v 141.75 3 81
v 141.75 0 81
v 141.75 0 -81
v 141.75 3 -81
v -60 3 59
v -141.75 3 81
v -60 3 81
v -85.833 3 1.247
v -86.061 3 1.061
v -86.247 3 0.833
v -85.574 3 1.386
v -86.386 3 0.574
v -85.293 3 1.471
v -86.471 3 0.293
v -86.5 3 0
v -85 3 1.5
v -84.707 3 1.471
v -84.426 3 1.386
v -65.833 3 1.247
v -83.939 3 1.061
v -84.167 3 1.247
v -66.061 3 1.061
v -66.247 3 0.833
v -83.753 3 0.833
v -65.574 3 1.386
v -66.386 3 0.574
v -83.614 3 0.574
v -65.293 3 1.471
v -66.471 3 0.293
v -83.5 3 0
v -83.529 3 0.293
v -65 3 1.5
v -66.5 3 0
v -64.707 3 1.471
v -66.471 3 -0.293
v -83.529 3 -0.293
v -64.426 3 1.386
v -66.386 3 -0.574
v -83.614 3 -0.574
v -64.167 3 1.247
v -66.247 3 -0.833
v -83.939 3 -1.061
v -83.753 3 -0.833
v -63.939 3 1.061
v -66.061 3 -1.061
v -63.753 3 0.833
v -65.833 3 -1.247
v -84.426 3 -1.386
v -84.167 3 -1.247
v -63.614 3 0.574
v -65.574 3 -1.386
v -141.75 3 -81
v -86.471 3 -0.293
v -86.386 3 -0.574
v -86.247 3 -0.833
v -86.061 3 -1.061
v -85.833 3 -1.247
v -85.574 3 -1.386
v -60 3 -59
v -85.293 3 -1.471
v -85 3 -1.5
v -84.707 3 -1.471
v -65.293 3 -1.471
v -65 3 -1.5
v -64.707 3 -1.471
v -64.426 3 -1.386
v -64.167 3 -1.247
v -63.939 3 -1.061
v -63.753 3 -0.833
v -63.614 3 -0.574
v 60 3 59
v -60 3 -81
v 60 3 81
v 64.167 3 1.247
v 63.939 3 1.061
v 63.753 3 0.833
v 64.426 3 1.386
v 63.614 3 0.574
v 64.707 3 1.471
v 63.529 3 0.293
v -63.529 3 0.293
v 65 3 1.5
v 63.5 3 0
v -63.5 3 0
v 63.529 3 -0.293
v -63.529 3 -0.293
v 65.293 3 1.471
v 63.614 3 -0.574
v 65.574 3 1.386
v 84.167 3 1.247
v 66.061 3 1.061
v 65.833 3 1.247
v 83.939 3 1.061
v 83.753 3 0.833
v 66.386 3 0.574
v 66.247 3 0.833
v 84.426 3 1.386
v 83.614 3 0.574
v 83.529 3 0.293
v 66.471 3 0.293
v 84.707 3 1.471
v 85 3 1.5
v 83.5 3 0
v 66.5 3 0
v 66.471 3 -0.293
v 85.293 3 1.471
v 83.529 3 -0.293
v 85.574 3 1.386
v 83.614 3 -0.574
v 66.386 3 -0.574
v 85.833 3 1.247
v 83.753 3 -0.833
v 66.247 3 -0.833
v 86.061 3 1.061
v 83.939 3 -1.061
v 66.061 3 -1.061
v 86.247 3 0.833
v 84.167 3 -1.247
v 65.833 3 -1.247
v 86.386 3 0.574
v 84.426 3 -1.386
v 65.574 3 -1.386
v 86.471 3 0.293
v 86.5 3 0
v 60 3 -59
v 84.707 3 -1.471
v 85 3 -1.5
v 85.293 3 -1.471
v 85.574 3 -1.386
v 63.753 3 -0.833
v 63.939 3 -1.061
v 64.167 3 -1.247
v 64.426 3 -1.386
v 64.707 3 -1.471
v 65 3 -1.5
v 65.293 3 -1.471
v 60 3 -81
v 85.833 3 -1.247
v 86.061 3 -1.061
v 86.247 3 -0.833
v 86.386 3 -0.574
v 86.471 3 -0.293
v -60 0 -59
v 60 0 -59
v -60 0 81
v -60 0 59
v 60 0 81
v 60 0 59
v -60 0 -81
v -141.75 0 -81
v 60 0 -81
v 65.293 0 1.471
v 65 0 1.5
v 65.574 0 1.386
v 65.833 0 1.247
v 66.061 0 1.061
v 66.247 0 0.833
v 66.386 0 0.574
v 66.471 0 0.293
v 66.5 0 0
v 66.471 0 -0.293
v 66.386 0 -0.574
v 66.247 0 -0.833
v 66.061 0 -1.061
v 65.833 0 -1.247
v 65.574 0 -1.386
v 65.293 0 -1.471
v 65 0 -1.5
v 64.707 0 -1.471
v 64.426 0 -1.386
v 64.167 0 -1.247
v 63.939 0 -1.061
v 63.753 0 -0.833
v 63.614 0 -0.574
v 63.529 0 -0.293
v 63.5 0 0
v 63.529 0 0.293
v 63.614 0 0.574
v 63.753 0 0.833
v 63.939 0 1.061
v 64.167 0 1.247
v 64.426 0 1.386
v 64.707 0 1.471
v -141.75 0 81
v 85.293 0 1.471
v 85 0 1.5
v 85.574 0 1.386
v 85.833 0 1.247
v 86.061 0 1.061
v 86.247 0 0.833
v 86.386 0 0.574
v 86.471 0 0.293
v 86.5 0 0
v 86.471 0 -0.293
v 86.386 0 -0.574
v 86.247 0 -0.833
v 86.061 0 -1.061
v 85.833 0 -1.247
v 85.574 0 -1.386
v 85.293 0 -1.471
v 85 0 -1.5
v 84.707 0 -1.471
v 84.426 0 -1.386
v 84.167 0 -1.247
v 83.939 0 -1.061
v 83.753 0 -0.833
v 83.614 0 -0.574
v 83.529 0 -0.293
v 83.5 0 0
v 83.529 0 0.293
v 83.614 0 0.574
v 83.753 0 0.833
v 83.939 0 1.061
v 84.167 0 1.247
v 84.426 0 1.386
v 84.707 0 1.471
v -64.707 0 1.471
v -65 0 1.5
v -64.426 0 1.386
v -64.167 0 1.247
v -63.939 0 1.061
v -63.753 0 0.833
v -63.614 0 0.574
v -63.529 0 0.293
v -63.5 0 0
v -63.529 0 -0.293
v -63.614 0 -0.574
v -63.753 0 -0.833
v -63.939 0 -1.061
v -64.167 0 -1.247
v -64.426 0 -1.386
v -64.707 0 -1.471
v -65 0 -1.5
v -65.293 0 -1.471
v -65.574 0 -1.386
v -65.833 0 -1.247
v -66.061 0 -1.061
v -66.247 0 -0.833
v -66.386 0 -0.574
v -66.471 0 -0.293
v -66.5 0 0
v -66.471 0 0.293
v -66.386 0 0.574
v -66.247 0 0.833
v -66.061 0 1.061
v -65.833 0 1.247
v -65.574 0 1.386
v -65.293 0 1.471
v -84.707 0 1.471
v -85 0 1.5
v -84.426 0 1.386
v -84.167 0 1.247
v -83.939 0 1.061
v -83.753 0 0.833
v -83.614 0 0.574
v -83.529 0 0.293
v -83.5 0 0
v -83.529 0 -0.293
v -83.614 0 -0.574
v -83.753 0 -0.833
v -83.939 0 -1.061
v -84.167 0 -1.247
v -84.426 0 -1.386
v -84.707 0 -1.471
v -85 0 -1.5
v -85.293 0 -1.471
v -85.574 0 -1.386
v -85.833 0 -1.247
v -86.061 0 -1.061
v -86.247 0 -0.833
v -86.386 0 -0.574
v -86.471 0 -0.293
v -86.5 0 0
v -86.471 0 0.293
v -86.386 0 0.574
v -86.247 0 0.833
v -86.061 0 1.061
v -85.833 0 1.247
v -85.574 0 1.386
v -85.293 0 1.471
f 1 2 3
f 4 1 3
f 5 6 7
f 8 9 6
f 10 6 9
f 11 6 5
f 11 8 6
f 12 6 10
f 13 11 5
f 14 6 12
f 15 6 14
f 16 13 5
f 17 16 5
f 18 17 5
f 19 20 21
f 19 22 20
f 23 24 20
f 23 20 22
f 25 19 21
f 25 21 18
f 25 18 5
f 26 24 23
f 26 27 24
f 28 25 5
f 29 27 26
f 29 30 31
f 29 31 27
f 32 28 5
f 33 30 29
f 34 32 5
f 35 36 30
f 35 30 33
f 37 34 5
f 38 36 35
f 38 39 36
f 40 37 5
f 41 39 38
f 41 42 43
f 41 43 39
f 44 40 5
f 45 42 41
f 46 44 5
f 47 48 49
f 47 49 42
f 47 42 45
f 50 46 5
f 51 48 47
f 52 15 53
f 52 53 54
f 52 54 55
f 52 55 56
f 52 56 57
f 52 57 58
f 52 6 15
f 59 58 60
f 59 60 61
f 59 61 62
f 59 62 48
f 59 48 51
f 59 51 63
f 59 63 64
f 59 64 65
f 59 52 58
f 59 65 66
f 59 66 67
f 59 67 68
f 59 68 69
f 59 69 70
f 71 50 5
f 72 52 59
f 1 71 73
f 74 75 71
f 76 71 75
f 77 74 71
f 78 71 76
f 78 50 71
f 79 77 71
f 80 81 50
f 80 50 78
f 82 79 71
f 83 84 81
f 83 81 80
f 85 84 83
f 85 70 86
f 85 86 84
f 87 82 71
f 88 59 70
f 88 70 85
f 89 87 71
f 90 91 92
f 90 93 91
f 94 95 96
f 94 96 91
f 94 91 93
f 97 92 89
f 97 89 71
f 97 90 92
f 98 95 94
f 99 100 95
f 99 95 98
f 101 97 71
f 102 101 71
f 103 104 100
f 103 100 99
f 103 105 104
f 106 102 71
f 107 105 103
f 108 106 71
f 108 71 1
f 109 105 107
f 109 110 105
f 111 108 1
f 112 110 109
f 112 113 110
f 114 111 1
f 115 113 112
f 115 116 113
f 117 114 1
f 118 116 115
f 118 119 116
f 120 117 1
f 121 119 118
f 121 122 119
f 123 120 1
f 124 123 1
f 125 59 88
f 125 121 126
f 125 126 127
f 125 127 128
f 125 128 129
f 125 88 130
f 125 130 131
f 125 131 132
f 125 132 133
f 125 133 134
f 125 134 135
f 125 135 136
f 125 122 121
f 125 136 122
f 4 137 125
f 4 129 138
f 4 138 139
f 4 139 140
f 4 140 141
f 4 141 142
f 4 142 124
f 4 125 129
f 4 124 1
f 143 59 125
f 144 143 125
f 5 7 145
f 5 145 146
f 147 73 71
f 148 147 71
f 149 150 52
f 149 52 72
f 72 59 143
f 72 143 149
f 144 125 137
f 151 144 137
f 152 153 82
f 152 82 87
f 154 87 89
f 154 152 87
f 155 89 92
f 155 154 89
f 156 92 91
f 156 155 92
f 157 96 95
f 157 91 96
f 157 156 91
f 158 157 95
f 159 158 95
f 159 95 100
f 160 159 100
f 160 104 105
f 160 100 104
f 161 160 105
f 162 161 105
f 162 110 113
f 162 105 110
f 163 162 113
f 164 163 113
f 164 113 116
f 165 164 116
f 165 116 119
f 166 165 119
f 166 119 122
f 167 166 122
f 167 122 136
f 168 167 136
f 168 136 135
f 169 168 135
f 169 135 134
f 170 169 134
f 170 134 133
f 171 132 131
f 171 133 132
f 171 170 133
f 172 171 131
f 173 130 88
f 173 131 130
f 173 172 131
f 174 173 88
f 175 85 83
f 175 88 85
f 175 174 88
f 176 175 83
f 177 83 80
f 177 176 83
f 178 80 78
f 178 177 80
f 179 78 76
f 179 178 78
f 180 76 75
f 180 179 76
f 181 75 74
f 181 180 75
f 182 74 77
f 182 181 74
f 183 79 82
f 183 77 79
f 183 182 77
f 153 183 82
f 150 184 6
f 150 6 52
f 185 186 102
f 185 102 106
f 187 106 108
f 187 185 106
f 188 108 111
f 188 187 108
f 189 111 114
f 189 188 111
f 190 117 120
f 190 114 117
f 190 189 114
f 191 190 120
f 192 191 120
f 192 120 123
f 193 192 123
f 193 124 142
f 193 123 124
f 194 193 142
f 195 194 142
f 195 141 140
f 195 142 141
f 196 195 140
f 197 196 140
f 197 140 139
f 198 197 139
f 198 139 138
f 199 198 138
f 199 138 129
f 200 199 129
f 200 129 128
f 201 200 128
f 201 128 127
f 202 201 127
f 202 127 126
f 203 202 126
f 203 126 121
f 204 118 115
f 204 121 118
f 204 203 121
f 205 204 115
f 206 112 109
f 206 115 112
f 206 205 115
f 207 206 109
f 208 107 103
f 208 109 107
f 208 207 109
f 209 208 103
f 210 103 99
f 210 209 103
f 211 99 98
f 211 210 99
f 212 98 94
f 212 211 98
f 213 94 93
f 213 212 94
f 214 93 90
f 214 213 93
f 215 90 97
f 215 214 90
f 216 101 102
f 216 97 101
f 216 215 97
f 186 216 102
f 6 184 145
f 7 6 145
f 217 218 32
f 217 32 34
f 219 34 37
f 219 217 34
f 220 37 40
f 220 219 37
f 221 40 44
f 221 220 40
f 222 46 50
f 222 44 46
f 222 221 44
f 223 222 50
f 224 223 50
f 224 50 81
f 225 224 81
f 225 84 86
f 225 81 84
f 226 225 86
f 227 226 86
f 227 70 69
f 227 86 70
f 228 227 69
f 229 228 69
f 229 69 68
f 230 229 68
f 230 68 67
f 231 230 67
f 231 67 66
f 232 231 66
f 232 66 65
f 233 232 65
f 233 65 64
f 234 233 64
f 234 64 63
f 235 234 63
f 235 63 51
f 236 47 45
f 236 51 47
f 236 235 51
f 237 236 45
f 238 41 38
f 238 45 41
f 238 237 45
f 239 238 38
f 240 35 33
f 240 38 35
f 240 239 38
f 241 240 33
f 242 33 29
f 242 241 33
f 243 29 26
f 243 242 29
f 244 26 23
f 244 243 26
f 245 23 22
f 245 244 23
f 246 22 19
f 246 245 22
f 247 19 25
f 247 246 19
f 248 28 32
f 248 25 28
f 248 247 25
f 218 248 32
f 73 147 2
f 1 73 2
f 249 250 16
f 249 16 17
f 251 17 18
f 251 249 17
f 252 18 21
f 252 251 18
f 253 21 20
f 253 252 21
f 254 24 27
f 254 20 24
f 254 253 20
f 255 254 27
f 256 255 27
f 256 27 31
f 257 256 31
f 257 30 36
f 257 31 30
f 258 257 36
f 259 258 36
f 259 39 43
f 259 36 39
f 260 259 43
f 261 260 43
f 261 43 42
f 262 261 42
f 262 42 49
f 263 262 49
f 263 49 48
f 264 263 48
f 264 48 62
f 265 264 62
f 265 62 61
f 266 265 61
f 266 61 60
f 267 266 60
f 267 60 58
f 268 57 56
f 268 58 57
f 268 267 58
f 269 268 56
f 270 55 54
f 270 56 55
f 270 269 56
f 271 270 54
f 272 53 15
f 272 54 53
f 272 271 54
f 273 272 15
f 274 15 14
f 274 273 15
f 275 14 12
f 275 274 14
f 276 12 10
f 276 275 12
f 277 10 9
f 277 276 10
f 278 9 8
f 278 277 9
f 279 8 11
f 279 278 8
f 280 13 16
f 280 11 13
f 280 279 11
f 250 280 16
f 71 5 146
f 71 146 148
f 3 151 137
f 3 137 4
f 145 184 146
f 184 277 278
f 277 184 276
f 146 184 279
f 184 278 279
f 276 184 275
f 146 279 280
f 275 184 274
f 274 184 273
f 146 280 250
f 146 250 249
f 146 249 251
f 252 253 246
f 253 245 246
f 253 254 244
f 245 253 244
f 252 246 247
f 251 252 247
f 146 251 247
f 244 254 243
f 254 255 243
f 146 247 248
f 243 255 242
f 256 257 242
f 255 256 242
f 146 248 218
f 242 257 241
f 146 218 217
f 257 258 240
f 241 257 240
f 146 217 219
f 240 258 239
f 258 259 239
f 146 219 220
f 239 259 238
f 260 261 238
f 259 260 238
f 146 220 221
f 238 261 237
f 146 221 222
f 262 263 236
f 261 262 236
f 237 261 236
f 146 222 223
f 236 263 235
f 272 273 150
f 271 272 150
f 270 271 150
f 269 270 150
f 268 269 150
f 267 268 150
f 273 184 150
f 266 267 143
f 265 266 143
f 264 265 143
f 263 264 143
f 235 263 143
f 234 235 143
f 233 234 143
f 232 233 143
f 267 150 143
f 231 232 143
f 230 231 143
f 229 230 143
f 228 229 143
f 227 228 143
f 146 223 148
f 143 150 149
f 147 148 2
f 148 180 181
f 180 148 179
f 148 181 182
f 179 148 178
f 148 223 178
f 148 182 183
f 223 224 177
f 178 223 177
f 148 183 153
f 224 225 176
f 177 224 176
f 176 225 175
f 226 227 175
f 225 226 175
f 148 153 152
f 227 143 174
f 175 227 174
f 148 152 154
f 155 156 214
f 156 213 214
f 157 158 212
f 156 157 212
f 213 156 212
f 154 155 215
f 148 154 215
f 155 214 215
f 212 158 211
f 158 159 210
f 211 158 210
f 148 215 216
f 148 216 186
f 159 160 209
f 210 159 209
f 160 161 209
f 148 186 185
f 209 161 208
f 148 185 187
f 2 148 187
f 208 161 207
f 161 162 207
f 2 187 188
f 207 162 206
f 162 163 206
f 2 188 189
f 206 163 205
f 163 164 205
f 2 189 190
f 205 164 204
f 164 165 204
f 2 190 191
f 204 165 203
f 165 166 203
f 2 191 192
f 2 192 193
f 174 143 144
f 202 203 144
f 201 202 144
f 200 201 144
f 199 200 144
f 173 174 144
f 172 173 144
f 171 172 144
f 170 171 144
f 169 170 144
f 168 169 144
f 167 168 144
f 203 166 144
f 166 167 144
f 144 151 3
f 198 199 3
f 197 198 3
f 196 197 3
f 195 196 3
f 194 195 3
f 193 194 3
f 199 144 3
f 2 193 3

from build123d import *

# Parameters (mm, degrees)
SKETCH1_W               = 283.5
SKETCH1_H               = 162
BOSS_EXTRUDE1_DEPTH     = 3
SKETCH2_W               = 120
SKETCH2_H               = 22
CUT_EXTRUDE1_DEPTH      = 3
CUT_EXTRUDE3_DEPTH      = 164.288280351
CUT_EXTRUDE3_DEPTH_BACK = 164.288280351
SKETCH4_R               = 1.5


with BuildPart() as part:
    # Sketch1 → Boss-Extrude1 (new body)
    with BuildSketch(Plane(origin=(0, 0, 0), x_dir=(1, 0, 0), z_dir=(0, 1, 0))):
        Rectangle(SKETCH1_W, SKETCH1_H)
    extrude(amount=BOSS_EXTRUDE1_DEPTH)

    # Sketch2 → Cut-Extrude1 (cut)
    with BuildSketch(Plane(origin=(0, 3, 0), x_dir=(1, 0, 0), z_dir=(0, 1, 0))):
        with Locations((0, -70)):
            Rectangle(SKETCH2_W, SKETCH2_H)
        with Locations((0, 70)):
            Rectangle(SKETCH2_W, SKETCH2_H)
    extrude(amount=-CUT_EXTRUDE1_DEPTH, mode=Mode.SUBTRACT)

    # Sketch4 → Cut-Extrude3 (cut, two sides: drawn at the far end of the back side and taken through both)
    with BuildSketch(Plane(origin=(0, 3, 0), x_dir=(1, 0, 0), z_dir=(0, 1, 0)).offset(-CUT_EXTRUDE3_DEPTH_BACK)):
        with Locations(Location((-85, 0, 0), (0, 0, 270))):
            Circle(SKETCH4_R)
        with Locations(Location((-65, 0, 0), (0, 0, 270))):
            Circle(SKETCH4_R)
        with Locations(Location((65, 0, 0), (0, 0, 270))):
            Circle(SKETCH4_R)
        with Locations(Location((85, 0, 0), (0, 0, 270))):
            Circle(SKETCH4_R)
    extrude(amount=CUT_EXTRUDE3_DEPTH + CUT_EXTRUDE3_DEPTH_BACK, mode=Mode.SUBTRACT)


solid = part.part
